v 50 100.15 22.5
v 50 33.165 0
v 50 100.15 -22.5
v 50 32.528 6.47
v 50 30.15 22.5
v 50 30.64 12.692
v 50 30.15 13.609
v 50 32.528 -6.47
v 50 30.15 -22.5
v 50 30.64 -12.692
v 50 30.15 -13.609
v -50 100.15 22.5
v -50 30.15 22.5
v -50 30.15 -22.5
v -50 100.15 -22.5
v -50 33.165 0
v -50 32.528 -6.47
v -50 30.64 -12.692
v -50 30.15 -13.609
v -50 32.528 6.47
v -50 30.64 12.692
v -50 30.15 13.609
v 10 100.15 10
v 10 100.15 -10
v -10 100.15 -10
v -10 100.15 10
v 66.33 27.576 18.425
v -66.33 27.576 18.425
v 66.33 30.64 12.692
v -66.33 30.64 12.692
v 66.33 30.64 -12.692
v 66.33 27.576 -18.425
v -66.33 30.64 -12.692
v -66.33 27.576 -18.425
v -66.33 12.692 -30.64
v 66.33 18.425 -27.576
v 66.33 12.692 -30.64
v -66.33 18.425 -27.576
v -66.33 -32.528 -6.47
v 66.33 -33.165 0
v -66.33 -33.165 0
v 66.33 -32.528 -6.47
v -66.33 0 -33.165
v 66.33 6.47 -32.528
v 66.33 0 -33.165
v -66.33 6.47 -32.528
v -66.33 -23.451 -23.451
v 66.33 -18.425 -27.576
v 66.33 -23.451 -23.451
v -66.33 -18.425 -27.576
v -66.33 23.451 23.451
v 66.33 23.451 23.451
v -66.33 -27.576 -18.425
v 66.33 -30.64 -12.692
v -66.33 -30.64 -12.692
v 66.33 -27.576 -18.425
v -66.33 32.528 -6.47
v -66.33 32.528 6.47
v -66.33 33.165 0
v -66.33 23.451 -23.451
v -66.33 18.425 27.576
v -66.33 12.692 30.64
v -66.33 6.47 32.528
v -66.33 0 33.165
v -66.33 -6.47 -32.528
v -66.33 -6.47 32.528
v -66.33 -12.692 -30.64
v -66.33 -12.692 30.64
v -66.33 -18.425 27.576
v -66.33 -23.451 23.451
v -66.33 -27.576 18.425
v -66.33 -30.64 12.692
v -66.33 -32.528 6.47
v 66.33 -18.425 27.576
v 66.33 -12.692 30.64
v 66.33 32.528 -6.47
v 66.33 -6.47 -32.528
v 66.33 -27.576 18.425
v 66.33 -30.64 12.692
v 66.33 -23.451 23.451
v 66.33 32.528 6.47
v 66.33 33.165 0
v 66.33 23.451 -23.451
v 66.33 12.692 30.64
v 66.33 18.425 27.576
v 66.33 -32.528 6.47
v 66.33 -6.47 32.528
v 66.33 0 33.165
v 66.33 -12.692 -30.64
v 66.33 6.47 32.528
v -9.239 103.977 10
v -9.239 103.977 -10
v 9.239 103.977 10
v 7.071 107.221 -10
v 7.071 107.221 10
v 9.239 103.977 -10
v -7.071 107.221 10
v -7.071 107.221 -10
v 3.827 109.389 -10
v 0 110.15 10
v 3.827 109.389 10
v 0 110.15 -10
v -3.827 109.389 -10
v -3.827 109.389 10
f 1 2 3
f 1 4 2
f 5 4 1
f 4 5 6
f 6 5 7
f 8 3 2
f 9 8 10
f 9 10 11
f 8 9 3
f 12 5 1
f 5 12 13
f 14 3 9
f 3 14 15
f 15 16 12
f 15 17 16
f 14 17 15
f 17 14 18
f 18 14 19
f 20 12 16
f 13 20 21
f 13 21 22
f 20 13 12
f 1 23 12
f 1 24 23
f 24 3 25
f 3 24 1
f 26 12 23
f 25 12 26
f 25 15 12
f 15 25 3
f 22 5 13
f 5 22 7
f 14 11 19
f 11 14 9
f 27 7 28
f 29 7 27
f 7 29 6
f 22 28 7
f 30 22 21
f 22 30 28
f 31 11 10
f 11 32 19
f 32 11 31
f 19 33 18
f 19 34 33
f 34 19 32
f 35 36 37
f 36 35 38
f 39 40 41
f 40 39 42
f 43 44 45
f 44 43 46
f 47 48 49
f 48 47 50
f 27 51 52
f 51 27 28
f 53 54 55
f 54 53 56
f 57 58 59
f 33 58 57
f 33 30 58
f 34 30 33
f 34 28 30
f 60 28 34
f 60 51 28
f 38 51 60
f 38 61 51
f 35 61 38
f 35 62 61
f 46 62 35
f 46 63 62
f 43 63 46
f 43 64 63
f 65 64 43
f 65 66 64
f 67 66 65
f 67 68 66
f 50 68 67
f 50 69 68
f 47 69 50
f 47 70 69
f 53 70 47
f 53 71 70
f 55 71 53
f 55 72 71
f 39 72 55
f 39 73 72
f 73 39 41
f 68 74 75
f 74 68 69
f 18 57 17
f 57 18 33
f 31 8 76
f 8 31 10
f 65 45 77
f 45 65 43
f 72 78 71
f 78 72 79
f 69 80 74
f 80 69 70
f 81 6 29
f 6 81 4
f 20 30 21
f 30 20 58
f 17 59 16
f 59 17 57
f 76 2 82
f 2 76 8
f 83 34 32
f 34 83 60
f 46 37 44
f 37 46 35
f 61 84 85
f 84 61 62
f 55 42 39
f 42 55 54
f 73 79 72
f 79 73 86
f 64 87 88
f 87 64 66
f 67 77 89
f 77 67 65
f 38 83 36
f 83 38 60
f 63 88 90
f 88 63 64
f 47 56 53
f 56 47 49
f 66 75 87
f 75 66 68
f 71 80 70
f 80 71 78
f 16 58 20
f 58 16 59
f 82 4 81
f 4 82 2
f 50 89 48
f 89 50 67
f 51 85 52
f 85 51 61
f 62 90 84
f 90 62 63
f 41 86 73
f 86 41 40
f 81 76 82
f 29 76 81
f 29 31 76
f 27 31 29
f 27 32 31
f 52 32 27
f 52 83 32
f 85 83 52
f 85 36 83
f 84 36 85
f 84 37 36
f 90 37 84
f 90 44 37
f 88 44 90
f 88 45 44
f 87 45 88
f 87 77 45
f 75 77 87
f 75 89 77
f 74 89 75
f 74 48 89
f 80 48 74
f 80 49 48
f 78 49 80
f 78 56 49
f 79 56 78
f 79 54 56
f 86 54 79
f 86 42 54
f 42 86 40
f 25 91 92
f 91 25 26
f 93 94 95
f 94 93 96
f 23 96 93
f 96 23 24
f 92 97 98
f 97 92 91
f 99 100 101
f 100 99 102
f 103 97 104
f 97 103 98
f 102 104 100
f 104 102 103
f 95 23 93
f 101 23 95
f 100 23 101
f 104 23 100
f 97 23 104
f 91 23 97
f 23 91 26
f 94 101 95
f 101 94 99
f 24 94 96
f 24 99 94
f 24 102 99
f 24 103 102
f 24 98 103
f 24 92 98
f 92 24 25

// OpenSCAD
// Auto-generated by scripts/author_from_manifest.py (Phase D.3).
// Source: data/phase_d_manifest.json (sku_intent='potter-vsr-flow-switch-2in').
// Do not hand-edit — regenerate from the manifest.
//
// @part potter_vsr_flow_switch_2in
// @kind device
// @category trim.flow.switch
// @display-name "Potter VSR Vane Flow Switch 2\""
// @mfg potter_electric_signal
// @mfg-pn VSR-2
// @listing UL FM
// @price-usd 115.00
// @install-minutes 18
// @crew journeyman
// @param size_in number default=2 label="Size" unit="in"
// @port pipe position=[0,0,0] direction=[-1,0,0] style=grooved size_in=2 role=run_a

size_in = 2.0;

function od_mm(nps) =
    nps ==   1  ? 33.4 :
    nps == 1.25 ? 42.2 :
    nps == 1.5  ? 48.3 :
    nps ==   2  ? 60.3 : 33.4;

od = od_mm(size_in);
box_w = 100;
box_h = 70;
box_d = 45;

union() {
    // Enclosure
    translate([0, box_h/2 + od/2, 0])
        cube([box_w, box_h, box_d], center = true);
    // Pipe saddle stub
    rotate([0, 90, 0])
        cylinder(h = od * 2.2, d = od * 1.1, center = true, $fn = 32);
    // Conduit nipple
    translate([0, box_h + od/2, 0])
        cylinder(h = 20, d = 20, center = true, $fn = 16);
}
